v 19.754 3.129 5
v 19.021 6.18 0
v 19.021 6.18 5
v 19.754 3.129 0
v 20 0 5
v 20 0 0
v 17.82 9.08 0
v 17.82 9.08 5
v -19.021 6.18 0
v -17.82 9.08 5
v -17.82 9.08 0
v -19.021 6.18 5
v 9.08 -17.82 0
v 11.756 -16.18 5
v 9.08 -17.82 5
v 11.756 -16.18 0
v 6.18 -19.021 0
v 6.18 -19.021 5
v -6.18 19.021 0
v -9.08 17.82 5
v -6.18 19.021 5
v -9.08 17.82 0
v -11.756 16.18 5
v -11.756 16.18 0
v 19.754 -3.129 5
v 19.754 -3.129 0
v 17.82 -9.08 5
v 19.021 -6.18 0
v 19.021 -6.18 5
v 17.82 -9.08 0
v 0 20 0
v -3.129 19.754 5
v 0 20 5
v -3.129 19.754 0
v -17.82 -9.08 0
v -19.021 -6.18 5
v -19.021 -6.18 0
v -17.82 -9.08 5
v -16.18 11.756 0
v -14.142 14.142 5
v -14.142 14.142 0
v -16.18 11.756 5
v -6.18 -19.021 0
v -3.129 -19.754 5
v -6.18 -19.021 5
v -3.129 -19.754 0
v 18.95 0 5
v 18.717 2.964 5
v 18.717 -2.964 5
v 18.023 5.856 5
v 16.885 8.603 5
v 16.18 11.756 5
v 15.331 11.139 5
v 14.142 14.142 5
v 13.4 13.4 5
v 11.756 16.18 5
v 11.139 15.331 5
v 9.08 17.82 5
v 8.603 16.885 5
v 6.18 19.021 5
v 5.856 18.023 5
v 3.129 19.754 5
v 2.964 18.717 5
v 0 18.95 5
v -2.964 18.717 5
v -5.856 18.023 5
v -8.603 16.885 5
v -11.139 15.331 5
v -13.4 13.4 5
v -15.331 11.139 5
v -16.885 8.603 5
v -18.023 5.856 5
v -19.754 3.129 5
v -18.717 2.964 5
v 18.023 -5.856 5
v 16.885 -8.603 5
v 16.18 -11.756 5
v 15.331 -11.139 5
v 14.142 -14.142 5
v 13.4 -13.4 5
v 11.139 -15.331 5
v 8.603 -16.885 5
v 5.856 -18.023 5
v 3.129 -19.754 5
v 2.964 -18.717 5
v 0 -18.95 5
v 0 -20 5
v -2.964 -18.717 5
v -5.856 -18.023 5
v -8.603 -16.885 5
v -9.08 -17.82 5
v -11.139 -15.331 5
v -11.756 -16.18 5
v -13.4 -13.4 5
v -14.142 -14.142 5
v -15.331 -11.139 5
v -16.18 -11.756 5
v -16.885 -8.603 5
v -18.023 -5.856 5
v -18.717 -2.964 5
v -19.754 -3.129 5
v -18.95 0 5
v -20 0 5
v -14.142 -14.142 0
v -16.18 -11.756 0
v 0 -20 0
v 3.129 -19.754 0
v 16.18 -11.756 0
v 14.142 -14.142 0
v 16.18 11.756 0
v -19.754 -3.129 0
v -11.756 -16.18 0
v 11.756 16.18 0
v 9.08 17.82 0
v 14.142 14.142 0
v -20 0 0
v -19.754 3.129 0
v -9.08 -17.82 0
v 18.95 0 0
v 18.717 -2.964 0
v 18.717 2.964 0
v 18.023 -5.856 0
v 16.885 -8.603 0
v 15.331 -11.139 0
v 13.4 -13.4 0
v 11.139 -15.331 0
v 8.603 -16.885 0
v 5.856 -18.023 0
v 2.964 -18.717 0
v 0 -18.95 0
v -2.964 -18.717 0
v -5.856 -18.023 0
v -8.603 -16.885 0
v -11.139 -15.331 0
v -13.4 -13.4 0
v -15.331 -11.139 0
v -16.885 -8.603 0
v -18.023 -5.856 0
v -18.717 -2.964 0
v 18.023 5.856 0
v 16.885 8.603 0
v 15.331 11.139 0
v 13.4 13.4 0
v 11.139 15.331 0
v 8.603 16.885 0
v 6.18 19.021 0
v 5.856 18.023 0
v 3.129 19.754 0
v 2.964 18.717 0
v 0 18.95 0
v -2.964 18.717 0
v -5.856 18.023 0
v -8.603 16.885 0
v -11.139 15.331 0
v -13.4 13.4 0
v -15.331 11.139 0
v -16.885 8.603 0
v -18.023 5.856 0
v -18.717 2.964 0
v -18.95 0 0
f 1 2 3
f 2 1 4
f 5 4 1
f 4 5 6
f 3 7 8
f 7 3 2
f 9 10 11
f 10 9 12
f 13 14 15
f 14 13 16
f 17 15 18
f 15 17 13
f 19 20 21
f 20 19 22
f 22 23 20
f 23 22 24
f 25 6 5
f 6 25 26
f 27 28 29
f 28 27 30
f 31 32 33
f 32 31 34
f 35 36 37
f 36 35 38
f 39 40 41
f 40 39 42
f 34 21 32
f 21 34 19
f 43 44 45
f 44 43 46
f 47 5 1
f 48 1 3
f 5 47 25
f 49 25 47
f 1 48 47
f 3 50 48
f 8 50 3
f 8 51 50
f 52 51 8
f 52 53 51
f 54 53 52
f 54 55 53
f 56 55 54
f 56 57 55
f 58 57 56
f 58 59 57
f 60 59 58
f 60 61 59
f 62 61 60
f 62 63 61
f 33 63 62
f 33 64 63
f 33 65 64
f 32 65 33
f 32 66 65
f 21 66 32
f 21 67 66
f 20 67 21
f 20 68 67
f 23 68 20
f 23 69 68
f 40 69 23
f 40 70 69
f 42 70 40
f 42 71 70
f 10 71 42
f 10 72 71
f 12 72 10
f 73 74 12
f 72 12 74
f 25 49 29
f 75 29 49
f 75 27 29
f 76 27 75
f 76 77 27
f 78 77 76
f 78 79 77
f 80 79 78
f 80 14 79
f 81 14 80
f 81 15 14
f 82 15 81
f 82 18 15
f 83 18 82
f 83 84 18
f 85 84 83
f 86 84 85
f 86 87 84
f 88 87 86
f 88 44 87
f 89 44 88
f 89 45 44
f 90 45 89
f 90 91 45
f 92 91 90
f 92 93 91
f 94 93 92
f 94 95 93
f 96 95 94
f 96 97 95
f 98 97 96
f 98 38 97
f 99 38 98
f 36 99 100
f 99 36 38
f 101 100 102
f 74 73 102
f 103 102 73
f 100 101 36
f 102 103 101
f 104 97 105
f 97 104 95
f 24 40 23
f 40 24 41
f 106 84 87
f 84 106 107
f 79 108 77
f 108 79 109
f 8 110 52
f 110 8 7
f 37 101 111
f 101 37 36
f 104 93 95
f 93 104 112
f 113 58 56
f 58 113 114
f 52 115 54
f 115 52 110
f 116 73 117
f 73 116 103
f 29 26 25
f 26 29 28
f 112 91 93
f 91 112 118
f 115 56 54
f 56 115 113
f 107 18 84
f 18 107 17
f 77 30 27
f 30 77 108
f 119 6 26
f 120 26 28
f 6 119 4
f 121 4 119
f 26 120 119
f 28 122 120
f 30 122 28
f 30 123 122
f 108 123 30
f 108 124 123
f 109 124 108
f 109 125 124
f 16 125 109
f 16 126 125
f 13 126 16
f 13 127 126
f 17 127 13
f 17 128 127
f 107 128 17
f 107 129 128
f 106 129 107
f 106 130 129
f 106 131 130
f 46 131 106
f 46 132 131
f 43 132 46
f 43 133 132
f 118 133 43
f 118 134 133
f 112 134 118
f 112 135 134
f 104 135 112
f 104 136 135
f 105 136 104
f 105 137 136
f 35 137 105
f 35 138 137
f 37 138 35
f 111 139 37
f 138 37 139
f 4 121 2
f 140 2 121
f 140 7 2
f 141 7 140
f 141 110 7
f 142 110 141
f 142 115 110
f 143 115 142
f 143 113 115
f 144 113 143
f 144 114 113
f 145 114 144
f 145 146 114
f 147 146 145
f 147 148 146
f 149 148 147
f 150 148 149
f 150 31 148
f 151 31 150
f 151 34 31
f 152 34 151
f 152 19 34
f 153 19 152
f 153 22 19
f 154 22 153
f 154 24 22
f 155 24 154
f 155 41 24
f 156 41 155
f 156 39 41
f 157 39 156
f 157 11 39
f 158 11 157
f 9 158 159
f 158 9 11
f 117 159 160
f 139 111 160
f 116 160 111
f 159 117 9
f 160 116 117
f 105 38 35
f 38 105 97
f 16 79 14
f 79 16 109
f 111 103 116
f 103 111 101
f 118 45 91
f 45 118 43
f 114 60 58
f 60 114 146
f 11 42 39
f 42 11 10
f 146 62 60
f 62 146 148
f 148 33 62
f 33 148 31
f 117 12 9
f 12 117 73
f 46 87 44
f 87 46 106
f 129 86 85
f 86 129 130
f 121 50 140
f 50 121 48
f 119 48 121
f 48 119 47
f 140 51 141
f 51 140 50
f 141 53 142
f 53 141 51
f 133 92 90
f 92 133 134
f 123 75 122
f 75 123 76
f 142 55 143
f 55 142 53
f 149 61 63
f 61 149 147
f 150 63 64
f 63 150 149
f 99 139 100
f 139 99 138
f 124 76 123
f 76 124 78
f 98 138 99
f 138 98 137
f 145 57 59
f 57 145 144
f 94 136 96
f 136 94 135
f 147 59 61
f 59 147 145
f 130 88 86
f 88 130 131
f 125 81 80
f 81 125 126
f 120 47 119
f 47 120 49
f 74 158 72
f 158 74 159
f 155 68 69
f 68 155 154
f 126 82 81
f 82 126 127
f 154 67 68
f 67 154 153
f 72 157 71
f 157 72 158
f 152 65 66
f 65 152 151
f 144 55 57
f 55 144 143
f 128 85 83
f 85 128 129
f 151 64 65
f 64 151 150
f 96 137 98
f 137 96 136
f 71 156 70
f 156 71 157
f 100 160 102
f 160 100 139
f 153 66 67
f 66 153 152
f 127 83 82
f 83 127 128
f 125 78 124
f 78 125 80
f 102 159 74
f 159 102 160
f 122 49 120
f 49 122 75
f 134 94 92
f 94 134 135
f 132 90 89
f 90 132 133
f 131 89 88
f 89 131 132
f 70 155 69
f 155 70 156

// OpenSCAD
thickness = 1.05;
$fn=40;

difference() {
	cylinder(r=20, h=5);
	cylinder(r=20 - thickness, h=5);
}
